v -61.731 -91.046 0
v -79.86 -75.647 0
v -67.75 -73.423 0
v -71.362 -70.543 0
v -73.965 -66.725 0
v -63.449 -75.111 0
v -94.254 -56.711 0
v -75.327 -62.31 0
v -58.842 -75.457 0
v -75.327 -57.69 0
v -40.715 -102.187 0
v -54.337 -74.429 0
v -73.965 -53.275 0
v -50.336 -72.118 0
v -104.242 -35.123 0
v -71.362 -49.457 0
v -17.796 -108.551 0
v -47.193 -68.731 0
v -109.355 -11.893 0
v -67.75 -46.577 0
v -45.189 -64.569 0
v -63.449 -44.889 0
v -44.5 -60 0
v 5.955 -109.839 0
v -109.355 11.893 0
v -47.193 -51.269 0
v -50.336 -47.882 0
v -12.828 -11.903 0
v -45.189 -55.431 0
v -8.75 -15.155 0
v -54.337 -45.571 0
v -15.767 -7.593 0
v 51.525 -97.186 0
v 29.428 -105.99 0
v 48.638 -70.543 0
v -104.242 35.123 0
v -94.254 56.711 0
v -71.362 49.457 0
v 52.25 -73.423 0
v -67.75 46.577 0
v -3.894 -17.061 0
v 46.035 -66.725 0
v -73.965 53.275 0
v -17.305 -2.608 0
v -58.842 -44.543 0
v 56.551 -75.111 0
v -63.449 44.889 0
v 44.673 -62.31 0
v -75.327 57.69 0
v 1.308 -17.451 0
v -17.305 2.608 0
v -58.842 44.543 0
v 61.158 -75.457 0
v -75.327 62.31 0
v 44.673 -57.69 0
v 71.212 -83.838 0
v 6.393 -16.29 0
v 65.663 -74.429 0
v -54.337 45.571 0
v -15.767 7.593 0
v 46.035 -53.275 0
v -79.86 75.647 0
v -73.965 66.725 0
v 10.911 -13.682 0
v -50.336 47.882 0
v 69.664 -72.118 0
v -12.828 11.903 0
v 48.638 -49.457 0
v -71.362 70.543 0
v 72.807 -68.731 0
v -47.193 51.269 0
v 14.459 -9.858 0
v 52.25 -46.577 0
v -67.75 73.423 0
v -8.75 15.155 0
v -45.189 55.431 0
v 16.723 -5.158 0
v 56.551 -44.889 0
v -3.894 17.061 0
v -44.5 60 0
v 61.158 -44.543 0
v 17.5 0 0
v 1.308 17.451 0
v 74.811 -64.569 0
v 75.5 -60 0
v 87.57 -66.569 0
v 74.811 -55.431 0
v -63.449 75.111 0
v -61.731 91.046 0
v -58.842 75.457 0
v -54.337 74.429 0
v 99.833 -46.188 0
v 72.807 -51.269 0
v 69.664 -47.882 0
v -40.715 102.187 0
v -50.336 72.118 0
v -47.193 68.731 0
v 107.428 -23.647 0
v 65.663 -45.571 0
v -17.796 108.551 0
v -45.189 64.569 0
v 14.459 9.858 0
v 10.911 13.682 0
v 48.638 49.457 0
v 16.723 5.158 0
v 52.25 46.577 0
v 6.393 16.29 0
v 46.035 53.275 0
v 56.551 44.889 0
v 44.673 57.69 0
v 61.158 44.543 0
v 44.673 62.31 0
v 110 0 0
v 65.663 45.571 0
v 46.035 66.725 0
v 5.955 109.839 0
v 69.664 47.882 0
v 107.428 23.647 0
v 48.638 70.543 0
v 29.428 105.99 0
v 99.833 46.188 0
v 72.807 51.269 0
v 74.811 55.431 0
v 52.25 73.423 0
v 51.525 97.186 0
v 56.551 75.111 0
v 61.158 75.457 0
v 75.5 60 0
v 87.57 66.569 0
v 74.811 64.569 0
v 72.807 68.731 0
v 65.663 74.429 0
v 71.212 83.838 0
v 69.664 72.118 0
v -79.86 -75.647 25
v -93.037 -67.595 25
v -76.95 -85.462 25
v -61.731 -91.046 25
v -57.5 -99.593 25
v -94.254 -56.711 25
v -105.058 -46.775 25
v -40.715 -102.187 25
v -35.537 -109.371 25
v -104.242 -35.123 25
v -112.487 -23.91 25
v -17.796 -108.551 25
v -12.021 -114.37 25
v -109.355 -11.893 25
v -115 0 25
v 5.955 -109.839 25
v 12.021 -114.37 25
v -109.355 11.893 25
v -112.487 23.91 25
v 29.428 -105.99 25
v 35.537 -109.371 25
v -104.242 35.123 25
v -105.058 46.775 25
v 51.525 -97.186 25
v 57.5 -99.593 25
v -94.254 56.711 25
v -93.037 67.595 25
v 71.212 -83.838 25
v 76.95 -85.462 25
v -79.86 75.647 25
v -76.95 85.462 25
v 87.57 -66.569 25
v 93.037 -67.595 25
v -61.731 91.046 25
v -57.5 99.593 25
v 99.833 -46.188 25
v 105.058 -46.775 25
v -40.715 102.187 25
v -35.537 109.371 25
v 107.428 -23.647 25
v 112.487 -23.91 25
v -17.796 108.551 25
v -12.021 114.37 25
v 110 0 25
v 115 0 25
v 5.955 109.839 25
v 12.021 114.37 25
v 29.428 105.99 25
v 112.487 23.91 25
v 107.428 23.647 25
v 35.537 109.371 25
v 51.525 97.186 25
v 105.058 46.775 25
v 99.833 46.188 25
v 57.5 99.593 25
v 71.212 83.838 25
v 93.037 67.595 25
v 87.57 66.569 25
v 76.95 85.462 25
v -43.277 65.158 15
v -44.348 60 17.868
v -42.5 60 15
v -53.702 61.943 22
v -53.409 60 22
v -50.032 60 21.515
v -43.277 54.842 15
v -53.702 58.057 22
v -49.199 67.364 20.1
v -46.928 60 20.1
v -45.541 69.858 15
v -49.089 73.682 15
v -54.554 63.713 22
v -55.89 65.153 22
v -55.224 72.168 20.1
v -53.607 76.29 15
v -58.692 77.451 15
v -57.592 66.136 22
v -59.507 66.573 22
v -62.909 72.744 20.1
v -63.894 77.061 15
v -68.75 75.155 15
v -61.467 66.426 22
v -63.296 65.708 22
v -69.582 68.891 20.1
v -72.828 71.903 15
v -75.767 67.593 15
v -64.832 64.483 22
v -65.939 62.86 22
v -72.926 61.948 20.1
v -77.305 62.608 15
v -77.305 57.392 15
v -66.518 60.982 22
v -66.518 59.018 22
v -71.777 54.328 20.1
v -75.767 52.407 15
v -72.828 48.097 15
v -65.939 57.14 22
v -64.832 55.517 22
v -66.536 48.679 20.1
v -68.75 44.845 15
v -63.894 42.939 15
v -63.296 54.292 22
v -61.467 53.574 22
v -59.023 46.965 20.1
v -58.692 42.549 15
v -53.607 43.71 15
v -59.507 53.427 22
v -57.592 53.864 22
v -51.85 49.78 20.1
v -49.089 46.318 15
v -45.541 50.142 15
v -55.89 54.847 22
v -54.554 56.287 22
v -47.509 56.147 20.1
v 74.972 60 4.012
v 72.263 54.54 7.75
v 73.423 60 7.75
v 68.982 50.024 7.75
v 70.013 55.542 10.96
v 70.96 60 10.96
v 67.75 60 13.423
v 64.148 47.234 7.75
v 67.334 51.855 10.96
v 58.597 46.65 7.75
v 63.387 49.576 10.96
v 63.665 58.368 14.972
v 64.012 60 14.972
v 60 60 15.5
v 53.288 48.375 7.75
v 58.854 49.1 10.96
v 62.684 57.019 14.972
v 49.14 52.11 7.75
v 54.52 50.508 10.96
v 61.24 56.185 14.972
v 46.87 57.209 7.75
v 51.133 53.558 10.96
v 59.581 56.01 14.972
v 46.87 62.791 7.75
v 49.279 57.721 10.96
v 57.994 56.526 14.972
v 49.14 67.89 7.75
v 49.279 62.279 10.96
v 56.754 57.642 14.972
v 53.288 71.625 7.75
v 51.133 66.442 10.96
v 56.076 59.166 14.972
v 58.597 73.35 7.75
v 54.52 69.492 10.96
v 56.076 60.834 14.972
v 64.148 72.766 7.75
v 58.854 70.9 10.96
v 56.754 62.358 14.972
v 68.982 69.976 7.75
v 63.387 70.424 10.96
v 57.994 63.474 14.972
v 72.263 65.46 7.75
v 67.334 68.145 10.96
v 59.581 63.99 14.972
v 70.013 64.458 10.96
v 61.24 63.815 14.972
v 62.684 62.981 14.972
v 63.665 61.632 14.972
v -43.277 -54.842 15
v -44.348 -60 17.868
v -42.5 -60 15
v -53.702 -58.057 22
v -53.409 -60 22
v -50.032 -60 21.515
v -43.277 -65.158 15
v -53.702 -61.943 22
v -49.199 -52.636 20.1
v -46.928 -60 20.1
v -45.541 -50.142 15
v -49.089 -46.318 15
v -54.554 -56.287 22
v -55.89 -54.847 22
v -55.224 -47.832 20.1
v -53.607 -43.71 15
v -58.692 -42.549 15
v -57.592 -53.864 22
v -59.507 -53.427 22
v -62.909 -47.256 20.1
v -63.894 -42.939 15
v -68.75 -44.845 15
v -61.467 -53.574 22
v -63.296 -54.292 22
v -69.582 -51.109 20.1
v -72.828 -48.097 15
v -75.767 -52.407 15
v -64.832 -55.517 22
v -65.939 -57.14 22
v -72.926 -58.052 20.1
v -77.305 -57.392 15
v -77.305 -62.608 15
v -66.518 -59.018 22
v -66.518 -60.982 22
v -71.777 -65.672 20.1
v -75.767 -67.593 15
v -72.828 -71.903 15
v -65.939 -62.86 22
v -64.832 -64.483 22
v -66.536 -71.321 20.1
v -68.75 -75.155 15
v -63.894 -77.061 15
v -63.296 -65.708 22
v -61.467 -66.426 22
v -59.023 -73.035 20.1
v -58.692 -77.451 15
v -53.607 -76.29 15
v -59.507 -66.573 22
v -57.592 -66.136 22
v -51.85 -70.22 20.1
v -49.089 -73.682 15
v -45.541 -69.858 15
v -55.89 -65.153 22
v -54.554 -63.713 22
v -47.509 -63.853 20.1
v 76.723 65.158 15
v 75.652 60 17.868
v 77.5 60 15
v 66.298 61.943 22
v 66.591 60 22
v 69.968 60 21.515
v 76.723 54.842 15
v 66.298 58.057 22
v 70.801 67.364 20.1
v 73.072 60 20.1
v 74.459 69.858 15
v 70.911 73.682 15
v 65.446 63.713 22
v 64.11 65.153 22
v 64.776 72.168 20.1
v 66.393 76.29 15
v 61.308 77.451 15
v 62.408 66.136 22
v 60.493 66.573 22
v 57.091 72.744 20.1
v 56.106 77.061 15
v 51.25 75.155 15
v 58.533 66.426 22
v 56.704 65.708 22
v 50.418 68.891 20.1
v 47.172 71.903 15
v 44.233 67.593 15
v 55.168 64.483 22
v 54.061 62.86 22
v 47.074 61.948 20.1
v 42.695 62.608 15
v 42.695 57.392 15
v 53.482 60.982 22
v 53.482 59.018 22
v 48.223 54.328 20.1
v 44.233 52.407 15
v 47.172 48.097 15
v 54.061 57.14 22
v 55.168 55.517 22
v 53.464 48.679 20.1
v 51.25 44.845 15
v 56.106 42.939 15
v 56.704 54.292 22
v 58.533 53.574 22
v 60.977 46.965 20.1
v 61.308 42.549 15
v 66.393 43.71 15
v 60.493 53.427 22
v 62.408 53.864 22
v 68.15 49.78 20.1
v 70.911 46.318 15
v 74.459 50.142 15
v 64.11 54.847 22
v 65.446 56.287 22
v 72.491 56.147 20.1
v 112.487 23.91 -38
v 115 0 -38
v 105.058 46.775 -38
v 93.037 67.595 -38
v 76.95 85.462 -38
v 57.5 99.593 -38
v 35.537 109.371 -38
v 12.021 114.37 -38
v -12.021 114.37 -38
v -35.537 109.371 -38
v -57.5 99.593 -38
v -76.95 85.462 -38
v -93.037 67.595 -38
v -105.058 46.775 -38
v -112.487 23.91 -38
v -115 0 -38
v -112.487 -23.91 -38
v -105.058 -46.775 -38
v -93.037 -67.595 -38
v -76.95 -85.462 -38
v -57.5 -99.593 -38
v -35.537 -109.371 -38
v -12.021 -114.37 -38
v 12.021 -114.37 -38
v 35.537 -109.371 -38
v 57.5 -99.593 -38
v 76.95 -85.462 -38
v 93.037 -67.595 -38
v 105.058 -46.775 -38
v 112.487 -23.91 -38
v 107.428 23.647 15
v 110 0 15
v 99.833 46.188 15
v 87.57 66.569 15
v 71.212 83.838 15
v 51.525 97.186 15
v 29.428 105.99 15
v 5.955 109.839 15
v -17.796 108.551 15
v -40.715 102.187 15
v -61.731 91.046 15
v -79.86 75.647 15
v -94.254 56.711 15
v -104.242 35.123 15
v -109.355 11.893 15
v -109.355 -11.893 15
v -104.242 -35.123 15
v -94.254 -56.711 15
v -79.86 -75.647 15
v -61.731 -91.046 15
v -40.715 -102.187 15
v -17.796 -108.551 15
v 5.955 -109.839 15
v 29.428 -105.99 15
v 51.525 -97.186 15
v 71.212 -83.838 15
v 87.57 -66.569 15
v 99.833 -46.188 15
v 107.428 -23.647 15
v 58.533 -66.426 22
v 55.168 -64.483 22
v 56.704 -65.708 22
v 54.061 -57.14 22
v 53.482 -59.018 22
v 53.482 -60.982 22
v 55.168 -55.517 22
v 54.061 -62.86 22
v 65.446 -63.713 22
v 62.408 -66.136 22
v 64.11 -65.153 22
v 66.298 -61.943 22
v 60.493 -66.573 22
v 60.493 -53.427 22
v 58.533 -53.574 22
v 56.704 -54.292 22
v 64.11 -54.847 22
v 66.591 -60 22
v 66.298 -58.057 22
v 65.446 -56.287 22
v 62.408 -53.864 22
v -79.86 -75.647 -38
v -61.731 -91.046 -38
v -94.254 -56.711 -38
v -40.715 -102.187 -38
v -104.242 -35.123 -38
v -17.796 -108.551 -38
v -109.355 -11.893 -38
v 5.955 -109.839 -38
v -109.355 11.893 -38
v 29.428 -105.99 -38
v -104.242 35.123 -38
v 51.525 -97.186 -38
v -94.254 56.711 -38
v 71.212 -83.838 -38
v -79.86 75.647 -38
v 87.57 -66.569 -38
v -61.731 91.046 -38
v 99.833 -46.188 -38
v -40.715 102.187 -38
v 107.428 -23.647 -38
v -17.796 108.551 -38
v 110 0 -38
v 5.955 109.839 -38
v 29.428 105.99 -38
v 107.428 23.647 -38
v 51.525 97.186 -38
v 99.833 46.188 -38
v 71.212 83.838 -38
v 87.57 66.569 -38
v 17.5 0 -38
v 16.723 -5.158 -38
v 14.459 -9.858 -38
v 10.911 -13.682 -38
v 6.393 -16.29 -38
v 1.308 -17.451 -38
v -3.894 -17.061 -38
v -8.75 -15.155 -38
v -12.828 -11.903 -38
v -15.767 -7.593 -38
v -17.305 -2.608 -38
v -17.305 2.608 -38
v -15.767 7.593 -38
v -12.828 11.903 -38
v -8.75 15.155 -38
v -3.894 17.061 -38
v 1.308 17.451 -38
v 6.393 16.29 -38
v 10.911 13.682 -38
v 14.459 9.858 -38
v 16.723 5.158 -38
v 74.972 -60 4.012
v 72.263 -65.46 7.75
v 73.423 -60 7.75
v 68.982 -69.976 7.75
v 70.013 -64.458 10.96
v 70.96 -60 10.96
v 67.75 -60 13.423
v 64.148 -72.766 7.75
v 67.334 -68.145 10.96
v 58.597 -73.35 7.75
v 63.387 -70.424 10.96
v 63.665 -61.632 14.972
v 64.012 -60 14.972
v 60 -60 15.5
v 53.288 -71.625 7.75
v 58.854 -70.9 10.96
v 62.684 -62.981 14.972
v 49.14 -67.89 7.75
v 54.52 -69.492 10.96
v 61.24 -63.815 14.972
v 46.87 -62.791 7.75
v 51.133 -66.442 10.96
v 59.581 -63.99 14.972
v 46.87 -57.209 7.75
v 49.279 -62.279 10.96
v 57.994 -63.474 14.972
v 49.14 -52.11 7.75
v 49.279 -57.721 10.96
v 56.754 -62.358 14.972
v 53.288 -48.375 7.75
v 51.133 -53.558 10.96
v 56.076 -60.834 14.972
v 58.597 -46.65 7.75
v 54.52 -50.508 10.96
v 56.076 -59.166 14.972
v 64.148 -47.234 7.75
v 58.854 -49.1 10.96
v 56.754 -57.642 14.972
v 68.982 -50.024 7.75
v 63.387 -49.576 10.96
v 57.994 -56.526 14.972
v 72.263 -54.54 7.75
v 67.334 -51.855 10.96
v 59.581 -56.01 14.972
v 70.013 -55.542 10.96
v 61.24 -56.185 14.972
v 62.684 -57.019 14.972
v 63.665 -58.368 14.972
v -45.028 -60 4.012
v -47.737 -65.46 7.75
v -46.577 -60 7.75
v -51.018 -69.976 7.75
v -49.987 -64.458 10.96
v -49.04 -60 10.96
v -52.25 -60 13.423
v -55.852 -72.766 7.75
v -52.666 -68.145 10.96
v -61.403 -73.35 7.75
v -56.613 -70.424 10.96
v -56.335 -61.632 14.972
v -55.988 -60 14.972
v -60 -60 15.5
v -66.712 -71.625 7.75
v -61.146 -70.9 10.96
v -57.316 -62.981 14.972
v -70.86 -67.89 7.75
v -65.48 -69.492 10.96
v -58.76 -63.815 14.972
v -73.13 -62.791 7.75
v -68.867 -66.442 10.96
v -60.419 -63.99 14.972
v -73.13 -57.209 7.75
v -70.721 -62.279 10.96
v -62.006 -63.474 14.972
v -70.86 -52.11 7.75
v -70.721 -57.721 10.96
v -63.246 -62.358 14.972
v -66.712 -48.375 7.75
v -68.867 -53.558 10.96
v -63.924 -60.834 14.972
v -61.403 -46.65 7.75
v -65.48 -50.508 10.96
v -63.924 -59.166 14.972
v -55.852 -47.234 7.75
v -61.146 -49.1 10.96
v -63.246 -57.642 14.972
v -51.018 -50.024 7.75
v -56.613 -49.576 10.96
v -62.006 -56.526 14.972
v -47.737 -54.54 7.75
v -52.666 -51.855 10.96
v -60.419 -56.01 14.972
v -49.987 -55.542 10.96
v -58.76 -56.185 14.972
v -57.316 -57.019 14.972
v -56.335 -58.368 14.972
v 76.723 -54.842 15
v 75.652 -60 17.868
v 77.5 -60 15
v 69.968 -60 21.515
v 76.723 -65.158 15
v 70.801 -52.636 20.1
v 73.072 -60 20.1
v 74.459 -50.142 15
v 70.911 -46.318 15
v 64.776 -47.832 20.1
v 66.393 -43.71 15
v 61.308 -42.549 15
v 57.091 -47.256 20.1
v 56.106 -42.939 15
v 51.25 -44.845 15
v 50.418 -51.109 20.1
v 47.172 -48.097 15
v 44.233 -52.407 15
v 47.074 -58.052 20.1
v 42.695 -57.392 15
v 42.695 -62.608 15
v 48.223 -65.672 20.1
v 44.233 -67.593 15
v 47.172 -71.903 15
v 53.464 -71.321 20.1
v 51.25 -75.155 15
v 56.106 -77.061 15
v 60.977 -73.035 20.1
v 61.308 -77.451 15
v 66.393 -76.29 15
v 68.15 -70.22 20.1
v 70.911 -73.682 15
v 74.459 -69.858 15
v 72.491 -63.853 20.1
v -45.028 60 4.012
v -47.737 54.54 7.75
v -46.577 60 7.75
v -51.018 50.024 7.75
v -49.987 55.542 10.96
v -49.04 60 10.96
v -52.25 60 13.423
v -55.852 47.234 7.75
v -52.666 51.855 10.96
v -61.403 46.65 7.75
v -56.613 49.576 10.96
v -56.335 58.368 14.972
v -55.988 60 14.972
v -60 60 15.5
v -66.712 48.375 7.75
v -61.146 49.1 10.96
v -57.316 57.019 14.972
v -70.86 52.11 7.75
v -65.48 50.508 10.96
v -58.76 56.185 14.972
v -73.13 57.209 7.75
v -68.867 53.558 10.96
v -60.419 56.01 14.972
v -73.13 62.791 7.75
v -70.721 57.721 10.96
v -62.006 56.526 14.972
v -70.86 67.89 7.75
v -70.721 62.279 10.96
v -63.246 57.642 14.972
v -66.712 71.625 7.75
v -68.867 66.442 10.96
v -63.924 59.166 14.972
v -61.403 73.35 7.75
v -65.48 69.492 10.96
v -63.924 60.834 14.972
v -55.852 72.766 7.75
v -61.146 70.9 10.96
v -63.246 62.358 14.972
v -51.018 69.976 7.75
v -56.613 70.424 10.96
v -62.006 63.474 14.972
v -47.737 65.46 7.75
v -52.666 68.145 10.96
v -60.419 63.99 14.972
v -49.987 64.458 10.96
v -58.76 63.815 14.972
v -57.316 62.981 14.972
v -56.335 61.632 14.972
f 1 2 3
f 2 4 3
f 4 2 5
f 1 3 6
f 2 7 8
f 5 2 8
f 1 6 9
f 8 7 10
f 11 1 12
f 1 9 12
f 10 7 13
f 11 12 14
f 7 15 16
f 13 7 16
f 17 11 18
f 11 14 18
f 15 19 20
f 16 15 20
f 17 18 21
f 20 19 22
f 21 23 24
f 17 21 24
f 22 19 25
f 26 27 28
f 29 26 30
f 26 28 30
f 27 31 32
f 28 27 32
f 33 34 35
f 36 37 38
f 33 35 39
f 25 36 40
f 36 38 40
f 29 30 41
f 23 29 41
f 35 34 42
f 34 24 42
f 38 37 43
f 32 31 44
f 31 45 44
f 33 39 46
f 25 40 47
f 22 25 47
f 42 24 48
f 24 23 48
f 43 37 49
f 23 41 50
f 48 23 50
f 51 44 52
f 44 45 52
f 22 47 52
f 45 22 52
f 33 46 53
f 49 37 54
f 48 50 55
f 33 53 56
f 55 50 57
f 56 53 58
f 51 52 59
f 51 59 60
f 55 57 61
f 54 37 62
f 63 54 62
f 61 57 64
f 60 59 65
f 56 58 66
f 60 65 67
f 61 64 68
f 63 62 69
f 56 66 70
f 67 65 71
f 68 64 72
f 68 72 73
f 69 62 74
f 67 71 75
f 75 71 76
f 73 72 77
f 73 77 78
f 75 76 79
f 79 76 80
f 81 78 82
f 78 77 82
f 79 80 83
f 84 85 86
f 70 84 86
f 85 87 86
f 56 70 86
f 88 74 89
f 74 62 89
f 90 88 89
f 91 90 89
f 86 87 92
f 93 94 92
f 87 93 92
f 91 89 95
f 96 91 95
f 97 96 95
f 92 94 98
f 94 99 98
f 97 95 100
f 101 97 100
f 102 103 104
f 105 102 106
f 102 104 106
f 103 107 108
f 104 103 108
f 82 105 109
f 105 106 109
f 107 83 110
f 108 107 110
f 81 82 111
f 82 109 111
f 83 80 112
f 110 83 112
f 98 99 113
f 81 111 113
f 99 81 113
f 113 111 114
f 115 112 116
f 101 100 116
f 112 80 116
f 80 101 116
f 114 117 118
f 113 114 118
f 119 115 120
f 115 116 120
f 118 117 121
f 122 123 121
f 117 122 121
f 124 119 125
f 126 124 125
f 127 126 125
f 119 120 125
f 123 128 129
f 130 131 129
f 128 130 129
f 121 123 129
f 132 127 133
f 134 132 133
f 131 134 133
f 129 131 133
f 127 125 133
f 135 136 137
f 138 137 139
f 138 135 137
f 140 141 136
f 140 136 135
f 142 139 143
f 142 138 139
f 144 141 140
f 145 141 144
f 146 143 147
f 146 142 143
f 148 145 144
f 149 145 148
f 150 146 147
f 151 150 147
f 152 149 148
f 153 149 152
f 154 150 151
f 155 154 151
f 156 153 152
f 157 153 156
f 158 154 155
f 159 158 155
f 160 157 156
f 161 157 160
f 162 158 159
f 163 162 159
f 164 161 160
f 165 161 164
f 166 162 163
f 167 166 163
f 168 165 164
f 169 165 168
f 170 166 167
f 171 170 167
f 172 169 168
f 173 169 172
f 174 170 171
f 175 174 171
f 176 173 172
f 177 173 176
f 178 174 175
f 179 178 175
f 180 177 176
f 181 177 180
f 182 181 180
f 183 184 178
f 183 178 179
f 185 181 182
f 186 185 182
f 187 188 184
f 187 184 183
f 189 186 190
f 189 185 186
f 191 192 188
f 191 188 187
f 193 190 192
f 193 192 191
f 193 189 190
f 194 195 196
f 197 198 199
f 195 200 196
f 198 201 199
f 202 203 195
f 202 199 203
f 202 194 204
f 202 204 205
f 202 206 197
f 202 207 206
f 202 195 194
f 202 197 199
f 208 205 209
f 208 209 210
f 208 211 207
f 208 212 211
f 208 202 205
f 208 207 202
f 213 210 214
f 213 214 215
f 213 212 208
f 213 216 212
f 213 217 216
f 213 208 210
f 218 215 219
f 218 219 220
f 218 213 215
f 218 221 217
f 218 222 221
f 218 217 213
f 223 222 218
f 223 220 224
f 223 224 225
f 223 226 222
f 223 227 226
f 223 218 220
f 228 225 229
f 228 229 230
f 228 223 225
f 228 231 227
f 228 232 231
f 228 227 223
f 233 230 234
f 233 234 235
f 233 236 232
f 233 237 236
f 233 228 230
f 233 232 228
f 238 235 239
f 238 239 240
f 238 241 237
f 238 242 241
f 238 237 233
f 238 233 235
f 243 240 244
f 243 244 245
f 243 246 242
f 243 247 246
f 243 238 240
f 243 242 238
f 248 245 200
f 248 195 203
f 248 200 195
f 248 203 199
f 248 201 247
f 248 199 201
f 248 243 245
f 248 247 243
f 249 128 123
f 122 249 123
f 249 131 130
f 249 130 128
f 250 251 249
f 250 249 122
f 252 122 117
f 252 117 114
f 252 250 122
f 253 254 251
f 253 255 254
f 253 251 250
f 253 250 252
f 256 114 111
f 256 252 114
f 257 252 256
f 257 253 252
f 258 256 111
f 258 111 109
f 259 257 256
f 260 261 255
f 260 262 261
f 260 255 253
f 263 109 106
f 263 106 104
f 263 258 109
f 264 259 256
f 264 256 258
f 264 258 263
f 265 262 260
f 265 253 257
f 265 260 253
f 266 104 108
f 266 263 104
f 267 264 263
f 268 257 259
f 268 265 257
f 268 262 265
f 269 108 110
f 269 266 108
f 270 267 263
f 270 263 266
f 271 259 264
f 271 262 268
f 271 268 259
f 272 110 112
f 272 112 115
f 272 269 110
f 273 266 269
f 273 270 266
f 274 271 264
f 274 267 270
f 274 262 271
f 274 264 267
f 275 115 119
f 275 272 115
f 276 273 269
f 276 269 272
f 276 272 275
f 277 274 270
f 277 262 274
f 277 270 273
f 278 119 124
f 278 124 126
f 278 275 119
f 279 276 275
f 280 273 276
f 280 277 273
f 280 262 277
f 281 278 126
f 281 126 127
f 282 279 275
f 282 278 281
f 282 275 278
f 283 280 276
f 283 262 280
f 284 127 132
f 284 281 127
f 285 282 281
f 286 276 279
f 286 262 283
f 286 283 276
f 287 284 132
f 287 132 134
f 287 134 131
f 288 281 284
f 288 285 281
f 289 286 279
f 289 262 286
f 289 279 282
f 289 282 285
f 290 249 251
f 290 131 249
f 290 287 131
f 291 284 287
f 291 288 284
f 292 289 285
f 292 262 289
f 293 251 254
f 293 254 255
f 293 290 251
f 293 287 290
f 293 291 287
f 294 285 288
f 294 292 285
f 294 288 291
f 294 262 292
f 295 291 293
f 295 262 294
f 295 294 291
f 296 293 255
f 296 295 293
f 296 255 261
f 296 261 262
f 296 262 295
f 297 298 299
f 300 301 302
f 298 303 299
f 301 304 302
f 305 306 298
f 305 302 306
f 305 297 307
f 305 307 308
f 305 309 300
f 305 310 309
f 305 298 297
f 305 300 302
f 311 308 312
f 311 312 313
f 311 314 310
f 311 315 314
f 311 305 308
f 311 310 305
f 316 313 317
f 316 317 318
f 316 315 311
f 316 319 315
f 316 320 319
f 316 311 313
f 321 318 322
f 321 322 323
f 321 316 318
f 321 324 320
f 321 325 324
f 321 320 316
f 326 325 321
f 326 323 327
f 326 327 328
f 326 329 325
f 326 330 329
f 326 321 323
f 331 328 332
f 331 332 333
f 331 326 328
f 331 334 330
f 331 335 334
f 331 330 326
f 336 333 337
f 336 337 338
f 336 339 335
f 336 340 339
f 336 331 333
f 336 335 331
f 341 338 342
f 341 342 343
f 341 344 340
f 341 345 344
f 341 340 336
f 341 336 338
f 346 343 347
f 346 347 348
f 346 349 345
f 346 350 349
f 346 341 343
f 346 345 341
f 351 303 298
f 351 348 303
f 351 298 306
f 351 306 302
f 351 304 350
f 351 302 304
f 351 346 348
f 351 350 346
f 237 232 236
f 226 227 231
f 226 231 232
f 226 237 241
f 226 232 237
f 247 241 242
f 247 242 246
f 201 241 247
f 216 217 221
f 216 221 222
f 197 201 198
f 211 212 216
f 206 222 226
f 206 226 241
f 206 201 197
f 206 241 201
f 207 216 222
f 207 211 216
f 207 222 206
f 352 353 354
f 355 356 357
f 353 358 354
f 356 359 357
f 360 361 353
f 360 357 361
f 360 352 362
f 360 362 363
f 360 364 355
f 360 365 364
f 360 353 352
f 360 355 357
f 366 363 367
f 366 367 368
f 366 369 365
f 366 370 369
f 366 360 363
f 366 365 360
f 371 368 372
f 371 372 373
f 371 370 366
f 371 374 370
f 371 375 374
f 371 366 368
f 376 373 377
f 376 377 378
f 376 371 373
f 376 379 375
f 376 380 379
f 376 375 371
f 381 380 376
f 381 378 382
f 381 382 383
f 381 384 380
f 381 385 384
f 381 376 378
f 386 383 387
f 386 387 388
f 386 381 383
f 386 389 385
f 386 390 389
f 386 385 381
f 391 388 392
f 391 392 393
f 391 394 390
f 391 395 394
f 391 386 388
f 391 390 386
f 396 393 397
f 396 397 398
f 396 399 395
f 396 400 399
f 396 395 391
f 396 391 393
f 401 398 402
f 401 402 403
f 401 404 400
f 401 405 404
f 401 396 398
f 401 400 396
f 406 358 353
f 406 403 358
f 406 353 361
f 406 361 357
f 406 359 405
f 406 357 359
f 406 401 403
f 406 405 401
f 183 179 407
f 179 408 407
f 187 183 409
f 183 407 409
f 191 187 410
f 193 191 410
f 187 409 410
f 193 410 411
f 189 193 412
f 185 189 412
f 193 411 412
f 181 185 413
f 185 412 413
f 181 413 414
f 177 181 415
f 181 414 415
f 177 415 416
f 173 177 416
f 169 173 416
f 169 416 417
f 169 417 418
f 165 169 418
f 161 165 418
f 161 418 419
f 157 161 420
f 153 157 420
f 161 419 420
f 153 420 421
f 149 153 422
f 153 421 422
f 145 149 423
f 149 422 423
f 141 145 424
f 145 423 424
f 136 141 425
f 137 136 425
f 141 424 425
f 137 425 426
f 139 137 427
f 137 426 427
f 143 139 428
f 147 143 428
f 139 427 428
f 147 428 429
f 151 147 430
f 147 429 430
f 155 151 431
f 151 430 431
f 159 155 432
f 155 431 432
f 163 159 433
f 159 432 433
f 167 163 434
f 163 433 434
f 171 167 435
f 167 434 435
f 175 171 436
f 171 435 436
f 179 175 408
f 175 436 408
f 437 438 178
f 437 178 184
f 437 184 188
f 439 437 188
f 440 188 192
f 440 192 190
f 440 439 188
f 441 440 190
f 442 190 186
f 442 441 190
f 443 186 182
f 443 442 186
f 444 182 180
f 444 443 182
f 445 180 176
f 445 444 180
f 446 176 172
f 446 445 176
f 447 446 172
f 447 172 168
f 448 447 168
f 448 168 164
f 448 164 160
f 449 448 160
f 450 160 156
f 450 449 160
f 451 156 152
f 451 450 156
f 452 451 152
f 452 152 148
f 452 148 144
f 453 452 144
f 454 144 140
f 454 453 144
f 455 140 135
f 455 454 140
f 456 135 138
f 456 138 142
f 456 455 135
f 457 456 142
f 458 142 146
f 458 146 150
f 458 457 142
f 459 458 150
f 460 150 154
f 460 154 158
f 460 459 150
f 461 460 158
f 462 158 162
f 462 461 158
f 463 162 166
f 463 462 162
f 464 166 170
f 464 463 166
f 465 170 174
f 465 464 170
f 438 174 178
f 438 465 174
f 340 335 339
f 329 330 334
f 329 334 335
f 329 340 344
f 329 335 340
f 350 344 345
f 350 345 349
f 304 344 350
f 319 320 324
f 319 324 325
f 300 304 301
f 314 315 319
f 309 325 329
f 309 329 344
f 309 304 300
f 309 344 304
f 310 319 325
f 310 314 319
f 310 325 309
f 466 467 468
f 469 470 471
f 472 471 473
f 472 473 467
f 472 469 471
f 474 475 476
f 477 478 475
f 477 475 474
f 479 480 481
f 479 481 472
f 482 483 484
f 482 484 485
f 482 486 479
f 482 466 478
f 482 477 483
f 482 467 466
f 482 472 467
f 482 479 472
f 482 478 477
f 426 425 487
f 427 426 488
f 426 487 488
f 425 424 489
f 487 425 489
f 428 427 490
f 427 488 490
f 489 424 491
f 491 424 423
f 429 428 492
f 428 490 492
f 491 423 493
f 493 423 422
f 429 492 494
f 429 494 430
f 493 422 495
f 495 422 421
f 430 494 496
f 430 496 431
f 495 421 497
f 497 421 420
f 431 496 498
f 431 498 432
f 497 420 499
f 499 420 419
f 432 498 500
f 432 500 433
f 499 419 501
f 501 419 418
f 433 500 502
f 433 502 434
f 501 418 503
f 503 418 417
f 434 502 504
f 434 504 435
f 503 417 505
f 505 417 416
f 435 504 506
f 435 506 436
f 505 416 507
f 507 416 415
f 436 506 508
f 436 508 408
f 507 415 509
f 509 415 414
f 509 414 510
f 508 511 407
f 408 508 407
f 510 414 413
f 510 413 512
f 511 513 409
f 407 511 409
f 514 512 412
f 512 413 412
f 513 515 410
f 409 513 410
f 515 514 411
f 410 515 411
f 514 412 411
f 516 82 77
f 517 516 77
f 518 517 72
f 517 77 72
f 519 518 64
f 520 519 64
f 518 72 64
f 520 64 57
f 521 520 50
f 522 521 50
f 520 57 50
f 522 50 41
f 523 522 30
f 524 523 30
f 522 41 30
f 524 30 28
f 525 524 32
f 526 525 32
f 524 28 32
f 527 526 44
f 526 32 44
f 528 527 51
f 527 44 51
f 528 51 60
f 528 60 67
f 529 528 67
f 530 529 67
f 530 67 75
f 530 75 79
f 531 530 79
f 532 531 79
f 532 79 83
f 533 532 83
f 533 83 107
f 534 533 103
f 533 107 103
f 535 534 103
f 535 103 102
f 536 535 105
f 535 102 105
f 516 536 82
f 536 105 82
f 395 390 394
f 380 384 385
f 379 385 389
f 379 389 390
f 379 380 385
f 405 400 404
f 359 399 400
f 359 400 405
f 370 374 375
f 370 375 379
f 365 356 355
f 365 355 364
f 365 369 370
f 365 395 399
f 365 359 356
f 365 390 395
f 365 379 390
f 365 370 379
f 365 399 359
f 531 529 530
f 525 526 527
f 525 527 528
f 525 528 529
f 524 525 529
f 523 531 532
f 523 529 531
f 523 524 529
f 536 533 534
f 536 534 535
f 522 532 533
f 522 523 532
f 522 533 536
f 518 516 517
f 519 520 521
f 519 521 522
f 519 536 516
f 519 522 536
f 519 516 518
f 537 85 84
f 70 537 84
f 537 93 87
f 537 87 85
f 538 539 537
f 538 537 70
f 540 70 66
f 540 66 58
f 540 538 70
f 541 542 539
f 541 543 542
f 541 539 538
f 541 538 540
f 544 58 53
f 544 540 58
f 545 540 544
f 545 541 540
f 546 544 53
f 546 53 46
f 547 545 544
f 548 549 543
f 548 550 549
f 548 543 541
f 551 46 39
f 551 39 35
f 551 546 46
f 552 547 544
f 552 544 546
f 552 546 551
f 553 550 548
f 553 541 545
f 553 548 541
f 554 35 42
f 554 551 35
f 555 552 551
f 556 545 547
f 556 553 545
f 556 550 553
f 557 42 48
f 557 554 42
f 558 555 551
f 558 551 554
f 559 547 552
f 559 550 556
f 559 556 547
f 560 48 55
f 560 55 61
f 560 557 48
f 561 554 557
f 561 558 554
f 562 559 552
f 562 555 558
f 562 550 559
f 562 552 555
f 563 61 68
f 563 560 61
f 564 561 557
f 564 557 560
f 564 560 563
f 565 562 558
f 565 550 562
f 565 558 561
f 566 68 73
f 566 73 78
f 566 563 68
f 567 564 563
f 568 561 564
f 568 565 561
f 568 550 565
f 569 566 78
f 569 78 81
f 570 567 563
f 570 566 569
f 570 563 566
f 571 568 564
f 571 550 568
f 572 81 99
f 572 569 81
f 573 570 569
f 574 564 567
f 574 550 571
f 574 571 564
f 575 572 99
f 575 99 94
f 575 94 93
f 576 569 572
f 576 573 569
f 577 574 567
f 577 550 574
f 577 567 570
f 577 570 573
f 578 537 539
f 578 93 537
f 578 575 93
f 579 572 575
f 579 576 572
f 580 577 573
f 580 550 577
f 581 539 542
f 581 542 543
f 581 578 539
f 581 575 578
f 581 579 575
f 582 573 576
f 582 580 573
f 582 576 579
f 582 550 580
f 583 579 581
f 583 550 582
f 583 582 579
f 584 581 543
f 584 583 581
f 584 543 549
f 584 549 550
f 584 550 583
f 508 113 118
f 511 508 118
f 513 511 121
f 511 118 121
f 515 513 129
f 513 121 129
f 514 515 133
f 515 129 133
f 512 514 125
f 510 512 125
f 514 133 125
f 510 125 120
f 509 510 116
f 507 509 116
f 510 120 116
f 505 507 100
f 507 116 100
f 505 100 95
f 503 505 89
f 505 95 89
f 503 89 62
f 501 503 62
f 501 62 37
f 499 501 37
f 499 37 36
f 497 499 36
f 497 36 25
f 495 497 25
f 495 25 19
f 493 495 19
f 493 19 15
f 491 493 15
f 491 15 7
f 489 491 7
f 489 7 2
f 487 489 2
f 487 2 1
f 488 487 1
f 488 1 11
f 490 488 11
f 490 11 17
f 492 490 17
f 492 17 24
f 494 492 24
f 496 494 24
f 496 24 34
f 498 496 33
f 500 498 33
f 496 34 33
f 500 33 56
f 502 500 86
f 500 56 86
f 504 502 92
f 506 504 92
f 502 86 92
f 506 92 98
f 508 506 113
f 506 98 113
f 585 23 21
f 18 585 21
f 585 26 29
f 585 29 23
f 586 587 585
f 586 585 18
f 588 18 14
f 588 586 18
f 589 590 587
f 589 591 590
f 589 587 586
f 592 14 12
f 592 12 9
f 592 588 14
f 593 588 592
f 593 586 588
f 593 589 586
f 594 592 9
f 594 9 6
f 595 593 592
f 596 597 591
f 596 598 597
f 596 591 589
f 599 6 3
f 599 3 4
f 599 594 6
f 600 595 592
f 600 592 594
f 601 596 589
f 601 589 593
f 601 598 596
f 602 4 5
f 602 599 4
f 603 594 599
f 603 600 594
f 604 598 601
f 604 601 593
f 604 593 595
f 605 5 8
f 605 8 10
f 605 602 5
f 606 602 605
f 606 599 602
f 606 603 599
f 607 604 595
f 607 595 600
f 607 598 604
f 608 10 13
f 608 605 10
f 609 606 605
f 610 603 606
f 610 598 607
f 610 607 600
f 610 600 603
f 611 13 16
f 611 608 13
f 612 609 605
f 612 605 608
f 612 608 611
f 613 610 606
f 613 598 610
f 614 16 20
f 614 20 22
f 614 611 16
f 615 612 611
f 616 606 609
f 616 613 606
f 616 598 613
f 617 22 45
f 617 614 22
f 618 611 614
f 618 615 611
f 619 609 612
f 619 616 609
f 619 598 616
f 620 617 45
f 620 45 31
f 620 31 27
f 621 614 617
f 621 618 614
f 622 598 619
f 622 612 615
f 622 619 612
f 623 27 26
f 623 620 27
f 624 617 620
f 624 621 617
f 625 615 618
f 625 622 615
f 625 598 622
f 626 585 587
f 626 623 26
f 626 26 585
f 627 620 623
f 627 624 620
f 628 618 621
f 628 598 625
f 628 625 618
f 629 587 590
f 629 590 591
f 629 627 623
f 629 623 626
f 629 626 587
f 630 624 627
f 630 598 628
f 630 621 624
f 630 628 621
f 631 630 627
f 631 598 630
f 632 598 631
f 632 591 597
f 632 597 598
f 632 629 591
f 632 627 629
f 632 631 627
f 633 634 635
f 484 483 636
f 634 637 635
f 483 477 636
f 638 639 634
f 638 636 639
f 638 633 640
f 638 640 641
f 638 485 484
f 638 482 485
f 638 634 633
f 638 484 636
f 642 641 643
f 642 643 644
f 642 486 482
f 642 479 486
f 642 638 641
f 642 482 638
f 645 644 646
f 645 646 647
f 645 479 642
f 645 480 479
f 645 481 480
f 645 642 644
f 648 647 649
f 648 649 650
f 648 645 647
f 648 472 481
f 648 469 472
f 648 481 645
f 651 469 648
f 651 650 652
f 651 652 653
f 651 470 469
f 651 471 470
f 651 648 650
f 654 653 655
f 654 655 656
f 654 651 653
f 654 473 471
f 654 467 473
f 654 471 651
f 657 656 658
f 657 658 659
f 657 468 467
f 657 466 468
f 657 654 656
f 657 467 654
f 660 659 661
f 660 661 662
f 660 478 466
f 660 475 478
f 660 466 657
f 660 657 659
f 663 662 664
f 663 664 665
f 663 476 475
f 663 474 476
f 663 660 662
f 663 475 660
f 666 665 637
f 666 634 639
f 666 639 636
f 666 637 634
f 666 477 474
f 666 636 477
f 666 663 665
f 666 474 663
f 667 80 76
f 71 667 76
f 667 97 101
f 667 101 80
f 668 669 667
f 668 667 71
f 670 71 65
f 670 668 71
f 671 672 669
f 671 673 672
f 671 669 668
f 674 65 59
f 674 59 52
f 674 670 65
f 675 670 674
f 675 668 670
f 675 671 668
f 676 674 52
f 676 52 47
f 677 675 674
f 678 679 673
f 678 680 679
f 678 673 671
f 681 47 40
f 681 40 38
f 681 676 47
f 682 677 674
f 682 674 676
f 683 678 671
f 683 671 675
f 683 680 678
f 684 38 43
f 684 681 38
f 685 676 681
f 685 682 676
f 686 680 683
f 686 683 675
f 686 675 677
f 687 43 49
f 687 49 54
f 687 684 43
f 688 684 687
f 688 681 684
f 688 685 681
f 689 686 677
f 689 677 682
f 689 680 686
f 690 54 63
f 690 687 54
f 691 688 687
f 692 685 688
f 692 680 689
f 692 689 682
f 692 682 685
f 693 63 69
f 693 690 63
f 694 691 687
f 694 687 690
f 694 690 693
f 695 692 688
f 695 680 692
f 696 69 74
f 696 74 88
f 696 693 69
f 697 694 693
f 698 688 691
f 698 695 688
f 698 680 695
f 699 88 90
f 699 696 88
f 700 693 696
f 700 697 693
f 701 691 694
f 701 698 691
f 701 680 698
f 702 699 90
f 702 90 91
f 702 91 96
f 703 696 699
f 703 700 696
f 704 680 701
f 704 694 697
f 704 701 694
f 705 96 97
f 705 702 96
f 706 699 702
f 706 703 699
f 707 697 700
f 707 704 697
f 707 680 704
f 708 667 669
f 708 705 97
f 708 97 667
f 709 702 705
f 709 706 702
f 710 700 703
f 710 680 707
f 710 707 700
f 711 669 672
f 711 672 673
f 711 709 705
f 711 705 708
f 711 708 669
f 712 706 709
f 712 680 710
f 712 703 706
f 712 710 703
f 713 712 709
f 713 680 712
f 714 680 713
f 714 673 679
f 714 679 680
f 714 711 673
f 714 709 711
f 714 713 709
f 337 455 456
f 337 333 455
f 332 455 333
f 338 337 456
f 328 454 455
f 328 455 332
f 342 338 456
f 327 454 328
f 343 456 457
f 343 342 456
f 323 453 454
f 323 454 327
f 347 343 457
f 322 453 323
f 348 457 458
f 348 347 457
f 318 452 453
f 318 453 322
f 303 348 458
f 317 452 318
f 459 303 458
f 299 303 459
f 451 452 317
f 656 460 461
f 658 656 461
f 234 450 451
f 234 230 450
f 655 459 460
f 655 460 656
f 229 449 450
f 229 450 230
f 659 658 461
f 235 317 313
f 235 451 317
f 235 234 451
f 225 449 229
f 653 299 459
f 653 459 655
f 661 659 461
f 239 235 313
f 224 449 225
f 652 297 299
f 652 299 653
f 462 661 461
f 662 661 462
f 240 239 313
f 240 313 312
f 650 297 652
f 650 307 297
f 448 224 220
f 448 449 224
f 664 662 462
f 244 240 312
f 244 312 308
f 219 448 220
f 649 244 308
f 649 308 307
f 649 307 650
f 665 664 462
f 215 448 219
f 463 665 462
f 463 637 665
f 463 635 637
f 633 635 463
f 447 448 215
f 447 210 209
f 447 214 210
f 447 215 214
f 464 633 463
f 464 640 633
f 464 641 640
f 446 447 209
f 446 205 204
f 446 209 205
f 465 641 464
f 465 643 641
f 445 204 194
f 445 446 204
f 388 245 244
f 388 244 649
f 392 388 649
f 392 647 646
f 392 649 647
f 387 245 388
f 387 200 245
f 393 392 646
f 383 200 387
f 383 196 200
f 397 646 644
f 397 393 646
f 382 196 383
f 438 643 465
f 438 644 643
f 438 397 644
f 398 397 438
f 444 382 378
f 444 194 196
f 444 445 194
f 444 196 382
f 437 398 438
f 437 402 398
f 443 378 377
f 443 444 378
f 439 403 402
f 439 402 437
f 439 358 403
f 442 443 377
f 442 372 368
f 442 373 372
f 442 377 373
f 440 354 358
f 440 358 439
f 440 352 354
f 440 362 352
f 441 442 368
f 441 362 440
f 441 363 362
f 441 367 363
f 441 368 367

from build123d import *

# Parameters (mm, degrees)
F0_R           = 115
F1_DEPTH       = 15
F2_R           = 17.5
F3_DEPTH       = 38
F4_R           = 17.5
F5_DEPTH       = 7
F6_R           = 15.5
F7_DEPTH       = 15.5
F8_R           = 15.49999
F10_R          = 115
F10_R_2        = 110
F11_DEPTH      = 10
F11_DEPTH_BACK = 53


# Not quite as in the source:
# - a fillet or chamfer that OpenCascade refuses, or shapes differently, is made with other operations: its cross-section is extruded or revolved along the edge and cut away or added
# - a fillet or chamfer is up to 0.001 mm smaller than in the source, because OpenCascade refuses the exact size


with BuildPart() as f1:
    # F0 (on Top) → F1 (new body)
    with BuildSketch(Plane.XY):
        Circle(F0_R)
    extrude(amount=F1_DEPTH)

    # F2 (on face) → F3 (join)
    with BuildSketch(Plane(origin=(0, 0, 0), x_dir=(1, 0, 0), z_dir=(0, 0, -1))):
        Circle(F2_R)
    extrude(amount=F3_DEPTH)

    # F4 (on face) → F5 (join)
    with BuildSketch(Plane.XY.offset(15)):
        with Locations((-60, 60)):
            Circle(F4_R)
        with Locations((-60, -60)):
            Circle(F4_R)
        with Locations((60, -60)):
            Circle(F4_R)
        with Locations((60, 60)):
            Circle(F4_R)
    extrude(amount=F5_DEPTH)

    # F6 (on face) → F7 (cut)
    with BuildSketch(Plane(origin=(0, 0, 0), x_dir=(1, 0, 0), z_dir=(0, 0, -1))):
        with Locations((-60, 60)):
            Circle(F6_R)
        with Locations((-60, -60)):
            Circle(F6_R)
        with Locations((60, -60)):
            Circle(F6_R)
        with Locations((60, 60)):
            Circle(F6_R)
    extrude(amount=-F7_DEPTH, mode=Mode.SUBTRACT)

    # F8 (radius 15.5 in the source; OpenCascade refuses exactly that, so slightly less here)
    f8_edges = [f1.edges().sort_by_distance(p)[0] for p in [
        (-75.5, -60, 15.5),
        (44.5, -60, 15.5),
        (44.5, 60, 15.5),
        (-75.5, 60, 15.5),
    ]]
    fillet(f8_edges, radius=F8_R)

    # F9: fillet of radius 12 on 4 edges, made by hand

    # F9_s1 → F9_t2 (revolve, cut)
    with BuildSketch(Plane.XZ.offset(60)):
        with BuildLine():
            ThreePointArc((-42.5, 15), (-46.9279714162, 20.0995049384), (-53.4087121146, 22))
            Line((-53.4087121146, 22), (-42.5, 22))
            Line((-42.5, 22), (-42.5, 15))
        make_face()
    revolve(axis=Axis((-60, -60, 22), (0, 0, 1)), mode=Mode.SUBTRACT)

    # F9_s3 → F9_t4 (revolve, cut)
    with BuildSketch(Plane.XZ.offset(-60)):
        with BuildLine():
            ThreePointArc((-42.5, 15), (-46.9279714162, 20.0995049384), (-53.4087121146, 22))
            Line((-53.4087121146, 22), (-42.5, 22))
            Line((-42.5, 22), (-42.5, 15))
        make_face()
    revolve(axis=Axis((-60, 60, 22), (0, 0, 1)), mode=Mode.SUBTRACT)

    # F9_s5 → F9_t6 (revolve, cut)
    with BuildSketch(Plane.XZ.offset(-60)):
        with BuildLine():
            ThreePointArc((77.5, 15), (73.0720285838, 20.0995049384), (66.5912878854, 22))
            Line((66.5912878854, 22), (77.5, 22))
            Line((77.5, 22), (77.5, 15))
        make_face()
    revolve(axis=Axis((60, 60, 22), (0, 0, 1)), mode=Mode.SUBTRACT)

    # F9_s7 → F9_t8 (revolve, cut)
    with BuildSketch(Plane.XZ.offset(60)):
        with BuildLine():
            ThreePointArc((77.5, 15), (73.0720285838, 20.0995049384), (66.5912878854, 22))
            Line((66.5912878854, 22), (77.5, 22))
            Line((77.5, 22), (77.5, 15))
        make_face()
    revolve(axis=Axis((60, -60, 22), (0, 0, 1)), mode=Mode.SUBTRACT)

    # F10 (on face) → F11 (join, two sides)
    with BuildSketch(Plane.XY.offset(15)) as f11_sk:
        Circle(F10_R)
        Circle(F10_R_2, mode=Mode.SUBTRACT)
    extrude(amount=F11_DEPTH)
    extrude(f11_sk.sketch, amount=-F11_DEPTH_BACK)


solid = f1.part
